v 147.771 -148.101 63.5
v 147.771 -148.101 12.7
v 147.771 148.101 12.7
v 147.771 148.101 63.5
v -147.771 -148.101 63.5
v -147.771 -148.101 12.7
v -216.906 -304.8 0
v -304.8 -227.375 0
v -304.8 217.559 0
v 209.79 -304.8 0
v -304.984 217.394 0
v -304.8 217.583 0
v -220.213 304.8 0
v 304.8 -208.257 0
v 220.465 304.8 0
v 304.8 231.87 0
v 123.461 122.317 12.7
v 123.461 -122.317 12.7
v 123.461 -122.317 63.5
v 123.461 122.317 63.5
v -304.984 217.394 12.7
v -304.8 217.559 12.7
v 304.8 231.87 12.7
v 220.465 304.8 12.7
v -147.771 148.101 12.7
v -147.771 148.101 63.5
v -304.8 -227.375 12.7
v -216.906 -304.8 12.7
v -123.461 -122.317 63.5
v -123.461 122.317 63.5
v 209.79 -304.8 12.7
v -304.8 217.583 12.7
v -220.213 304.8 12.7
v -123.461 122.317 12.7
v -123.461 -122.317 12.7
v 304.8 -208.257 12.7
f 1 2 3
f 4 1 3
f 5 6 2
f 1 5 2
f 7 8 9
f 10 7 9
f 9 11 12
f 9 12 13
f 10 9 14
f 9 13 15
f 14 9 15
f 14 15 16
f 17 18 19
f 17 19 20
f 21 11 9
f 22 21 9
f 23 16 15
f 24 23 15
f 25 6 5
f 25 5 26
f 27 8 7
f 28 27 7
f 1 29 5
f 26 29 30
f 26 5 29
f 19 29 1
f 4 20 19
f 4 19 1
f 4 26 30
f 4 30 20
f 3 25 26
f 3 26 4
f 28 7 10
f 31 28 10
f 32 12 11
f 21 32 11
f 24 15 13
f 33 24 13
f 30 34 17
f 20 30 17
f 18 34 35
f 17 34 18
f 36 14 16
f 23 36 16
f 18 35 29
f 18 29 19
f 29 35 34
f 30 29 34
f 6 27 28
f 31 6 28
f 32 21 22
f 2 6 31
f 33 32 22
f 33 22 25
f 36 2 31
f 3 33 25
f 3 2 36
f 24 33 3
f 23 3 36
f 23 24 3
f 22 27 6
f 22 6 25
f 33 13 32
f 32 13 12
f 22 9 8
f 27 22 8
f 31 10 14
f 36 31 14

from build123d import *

# Parameters (mm, degrees)
F1_DEPTH = 12.7
F3_W     = 295.542716
F3_H     = 296.202182
F3_W_2   = 246.921896
F3_H_2   = 244.63451
F4_DEPTH = 50.8


with BuildPart() as f1:
    # F0 (on Top) → F1 (new body)
    with BuildSketch(Plane.XY):
        Polygon((304.8, 231.870204), (220.464751, 304.8), (-220.213354, 304.8), (-304.8, 217.583231), (-304.8, 217.559303), (-304.8, -227.374971), (-216.906339, -304.8), (209.789738, -304.8), (304.8, -208.257139), align=None)
        Polygon((-304.8, 217.559303), (-304.8, 217.583231), (-304.983646, 217.393875), align=None)
    extrude(amount=F1_DEPTH)

    # F3 (on face) → F4 (join)
    with BuildSketch(Plane.XY.offset(12.7)):
        Rectangle(F3_W, F3_H)
        Rectangle(F3_W_2, F3_H_2, mode=Mode.SUBTRACT)
    extrude(amount=F4_DEPTH)


solid = f1.part
